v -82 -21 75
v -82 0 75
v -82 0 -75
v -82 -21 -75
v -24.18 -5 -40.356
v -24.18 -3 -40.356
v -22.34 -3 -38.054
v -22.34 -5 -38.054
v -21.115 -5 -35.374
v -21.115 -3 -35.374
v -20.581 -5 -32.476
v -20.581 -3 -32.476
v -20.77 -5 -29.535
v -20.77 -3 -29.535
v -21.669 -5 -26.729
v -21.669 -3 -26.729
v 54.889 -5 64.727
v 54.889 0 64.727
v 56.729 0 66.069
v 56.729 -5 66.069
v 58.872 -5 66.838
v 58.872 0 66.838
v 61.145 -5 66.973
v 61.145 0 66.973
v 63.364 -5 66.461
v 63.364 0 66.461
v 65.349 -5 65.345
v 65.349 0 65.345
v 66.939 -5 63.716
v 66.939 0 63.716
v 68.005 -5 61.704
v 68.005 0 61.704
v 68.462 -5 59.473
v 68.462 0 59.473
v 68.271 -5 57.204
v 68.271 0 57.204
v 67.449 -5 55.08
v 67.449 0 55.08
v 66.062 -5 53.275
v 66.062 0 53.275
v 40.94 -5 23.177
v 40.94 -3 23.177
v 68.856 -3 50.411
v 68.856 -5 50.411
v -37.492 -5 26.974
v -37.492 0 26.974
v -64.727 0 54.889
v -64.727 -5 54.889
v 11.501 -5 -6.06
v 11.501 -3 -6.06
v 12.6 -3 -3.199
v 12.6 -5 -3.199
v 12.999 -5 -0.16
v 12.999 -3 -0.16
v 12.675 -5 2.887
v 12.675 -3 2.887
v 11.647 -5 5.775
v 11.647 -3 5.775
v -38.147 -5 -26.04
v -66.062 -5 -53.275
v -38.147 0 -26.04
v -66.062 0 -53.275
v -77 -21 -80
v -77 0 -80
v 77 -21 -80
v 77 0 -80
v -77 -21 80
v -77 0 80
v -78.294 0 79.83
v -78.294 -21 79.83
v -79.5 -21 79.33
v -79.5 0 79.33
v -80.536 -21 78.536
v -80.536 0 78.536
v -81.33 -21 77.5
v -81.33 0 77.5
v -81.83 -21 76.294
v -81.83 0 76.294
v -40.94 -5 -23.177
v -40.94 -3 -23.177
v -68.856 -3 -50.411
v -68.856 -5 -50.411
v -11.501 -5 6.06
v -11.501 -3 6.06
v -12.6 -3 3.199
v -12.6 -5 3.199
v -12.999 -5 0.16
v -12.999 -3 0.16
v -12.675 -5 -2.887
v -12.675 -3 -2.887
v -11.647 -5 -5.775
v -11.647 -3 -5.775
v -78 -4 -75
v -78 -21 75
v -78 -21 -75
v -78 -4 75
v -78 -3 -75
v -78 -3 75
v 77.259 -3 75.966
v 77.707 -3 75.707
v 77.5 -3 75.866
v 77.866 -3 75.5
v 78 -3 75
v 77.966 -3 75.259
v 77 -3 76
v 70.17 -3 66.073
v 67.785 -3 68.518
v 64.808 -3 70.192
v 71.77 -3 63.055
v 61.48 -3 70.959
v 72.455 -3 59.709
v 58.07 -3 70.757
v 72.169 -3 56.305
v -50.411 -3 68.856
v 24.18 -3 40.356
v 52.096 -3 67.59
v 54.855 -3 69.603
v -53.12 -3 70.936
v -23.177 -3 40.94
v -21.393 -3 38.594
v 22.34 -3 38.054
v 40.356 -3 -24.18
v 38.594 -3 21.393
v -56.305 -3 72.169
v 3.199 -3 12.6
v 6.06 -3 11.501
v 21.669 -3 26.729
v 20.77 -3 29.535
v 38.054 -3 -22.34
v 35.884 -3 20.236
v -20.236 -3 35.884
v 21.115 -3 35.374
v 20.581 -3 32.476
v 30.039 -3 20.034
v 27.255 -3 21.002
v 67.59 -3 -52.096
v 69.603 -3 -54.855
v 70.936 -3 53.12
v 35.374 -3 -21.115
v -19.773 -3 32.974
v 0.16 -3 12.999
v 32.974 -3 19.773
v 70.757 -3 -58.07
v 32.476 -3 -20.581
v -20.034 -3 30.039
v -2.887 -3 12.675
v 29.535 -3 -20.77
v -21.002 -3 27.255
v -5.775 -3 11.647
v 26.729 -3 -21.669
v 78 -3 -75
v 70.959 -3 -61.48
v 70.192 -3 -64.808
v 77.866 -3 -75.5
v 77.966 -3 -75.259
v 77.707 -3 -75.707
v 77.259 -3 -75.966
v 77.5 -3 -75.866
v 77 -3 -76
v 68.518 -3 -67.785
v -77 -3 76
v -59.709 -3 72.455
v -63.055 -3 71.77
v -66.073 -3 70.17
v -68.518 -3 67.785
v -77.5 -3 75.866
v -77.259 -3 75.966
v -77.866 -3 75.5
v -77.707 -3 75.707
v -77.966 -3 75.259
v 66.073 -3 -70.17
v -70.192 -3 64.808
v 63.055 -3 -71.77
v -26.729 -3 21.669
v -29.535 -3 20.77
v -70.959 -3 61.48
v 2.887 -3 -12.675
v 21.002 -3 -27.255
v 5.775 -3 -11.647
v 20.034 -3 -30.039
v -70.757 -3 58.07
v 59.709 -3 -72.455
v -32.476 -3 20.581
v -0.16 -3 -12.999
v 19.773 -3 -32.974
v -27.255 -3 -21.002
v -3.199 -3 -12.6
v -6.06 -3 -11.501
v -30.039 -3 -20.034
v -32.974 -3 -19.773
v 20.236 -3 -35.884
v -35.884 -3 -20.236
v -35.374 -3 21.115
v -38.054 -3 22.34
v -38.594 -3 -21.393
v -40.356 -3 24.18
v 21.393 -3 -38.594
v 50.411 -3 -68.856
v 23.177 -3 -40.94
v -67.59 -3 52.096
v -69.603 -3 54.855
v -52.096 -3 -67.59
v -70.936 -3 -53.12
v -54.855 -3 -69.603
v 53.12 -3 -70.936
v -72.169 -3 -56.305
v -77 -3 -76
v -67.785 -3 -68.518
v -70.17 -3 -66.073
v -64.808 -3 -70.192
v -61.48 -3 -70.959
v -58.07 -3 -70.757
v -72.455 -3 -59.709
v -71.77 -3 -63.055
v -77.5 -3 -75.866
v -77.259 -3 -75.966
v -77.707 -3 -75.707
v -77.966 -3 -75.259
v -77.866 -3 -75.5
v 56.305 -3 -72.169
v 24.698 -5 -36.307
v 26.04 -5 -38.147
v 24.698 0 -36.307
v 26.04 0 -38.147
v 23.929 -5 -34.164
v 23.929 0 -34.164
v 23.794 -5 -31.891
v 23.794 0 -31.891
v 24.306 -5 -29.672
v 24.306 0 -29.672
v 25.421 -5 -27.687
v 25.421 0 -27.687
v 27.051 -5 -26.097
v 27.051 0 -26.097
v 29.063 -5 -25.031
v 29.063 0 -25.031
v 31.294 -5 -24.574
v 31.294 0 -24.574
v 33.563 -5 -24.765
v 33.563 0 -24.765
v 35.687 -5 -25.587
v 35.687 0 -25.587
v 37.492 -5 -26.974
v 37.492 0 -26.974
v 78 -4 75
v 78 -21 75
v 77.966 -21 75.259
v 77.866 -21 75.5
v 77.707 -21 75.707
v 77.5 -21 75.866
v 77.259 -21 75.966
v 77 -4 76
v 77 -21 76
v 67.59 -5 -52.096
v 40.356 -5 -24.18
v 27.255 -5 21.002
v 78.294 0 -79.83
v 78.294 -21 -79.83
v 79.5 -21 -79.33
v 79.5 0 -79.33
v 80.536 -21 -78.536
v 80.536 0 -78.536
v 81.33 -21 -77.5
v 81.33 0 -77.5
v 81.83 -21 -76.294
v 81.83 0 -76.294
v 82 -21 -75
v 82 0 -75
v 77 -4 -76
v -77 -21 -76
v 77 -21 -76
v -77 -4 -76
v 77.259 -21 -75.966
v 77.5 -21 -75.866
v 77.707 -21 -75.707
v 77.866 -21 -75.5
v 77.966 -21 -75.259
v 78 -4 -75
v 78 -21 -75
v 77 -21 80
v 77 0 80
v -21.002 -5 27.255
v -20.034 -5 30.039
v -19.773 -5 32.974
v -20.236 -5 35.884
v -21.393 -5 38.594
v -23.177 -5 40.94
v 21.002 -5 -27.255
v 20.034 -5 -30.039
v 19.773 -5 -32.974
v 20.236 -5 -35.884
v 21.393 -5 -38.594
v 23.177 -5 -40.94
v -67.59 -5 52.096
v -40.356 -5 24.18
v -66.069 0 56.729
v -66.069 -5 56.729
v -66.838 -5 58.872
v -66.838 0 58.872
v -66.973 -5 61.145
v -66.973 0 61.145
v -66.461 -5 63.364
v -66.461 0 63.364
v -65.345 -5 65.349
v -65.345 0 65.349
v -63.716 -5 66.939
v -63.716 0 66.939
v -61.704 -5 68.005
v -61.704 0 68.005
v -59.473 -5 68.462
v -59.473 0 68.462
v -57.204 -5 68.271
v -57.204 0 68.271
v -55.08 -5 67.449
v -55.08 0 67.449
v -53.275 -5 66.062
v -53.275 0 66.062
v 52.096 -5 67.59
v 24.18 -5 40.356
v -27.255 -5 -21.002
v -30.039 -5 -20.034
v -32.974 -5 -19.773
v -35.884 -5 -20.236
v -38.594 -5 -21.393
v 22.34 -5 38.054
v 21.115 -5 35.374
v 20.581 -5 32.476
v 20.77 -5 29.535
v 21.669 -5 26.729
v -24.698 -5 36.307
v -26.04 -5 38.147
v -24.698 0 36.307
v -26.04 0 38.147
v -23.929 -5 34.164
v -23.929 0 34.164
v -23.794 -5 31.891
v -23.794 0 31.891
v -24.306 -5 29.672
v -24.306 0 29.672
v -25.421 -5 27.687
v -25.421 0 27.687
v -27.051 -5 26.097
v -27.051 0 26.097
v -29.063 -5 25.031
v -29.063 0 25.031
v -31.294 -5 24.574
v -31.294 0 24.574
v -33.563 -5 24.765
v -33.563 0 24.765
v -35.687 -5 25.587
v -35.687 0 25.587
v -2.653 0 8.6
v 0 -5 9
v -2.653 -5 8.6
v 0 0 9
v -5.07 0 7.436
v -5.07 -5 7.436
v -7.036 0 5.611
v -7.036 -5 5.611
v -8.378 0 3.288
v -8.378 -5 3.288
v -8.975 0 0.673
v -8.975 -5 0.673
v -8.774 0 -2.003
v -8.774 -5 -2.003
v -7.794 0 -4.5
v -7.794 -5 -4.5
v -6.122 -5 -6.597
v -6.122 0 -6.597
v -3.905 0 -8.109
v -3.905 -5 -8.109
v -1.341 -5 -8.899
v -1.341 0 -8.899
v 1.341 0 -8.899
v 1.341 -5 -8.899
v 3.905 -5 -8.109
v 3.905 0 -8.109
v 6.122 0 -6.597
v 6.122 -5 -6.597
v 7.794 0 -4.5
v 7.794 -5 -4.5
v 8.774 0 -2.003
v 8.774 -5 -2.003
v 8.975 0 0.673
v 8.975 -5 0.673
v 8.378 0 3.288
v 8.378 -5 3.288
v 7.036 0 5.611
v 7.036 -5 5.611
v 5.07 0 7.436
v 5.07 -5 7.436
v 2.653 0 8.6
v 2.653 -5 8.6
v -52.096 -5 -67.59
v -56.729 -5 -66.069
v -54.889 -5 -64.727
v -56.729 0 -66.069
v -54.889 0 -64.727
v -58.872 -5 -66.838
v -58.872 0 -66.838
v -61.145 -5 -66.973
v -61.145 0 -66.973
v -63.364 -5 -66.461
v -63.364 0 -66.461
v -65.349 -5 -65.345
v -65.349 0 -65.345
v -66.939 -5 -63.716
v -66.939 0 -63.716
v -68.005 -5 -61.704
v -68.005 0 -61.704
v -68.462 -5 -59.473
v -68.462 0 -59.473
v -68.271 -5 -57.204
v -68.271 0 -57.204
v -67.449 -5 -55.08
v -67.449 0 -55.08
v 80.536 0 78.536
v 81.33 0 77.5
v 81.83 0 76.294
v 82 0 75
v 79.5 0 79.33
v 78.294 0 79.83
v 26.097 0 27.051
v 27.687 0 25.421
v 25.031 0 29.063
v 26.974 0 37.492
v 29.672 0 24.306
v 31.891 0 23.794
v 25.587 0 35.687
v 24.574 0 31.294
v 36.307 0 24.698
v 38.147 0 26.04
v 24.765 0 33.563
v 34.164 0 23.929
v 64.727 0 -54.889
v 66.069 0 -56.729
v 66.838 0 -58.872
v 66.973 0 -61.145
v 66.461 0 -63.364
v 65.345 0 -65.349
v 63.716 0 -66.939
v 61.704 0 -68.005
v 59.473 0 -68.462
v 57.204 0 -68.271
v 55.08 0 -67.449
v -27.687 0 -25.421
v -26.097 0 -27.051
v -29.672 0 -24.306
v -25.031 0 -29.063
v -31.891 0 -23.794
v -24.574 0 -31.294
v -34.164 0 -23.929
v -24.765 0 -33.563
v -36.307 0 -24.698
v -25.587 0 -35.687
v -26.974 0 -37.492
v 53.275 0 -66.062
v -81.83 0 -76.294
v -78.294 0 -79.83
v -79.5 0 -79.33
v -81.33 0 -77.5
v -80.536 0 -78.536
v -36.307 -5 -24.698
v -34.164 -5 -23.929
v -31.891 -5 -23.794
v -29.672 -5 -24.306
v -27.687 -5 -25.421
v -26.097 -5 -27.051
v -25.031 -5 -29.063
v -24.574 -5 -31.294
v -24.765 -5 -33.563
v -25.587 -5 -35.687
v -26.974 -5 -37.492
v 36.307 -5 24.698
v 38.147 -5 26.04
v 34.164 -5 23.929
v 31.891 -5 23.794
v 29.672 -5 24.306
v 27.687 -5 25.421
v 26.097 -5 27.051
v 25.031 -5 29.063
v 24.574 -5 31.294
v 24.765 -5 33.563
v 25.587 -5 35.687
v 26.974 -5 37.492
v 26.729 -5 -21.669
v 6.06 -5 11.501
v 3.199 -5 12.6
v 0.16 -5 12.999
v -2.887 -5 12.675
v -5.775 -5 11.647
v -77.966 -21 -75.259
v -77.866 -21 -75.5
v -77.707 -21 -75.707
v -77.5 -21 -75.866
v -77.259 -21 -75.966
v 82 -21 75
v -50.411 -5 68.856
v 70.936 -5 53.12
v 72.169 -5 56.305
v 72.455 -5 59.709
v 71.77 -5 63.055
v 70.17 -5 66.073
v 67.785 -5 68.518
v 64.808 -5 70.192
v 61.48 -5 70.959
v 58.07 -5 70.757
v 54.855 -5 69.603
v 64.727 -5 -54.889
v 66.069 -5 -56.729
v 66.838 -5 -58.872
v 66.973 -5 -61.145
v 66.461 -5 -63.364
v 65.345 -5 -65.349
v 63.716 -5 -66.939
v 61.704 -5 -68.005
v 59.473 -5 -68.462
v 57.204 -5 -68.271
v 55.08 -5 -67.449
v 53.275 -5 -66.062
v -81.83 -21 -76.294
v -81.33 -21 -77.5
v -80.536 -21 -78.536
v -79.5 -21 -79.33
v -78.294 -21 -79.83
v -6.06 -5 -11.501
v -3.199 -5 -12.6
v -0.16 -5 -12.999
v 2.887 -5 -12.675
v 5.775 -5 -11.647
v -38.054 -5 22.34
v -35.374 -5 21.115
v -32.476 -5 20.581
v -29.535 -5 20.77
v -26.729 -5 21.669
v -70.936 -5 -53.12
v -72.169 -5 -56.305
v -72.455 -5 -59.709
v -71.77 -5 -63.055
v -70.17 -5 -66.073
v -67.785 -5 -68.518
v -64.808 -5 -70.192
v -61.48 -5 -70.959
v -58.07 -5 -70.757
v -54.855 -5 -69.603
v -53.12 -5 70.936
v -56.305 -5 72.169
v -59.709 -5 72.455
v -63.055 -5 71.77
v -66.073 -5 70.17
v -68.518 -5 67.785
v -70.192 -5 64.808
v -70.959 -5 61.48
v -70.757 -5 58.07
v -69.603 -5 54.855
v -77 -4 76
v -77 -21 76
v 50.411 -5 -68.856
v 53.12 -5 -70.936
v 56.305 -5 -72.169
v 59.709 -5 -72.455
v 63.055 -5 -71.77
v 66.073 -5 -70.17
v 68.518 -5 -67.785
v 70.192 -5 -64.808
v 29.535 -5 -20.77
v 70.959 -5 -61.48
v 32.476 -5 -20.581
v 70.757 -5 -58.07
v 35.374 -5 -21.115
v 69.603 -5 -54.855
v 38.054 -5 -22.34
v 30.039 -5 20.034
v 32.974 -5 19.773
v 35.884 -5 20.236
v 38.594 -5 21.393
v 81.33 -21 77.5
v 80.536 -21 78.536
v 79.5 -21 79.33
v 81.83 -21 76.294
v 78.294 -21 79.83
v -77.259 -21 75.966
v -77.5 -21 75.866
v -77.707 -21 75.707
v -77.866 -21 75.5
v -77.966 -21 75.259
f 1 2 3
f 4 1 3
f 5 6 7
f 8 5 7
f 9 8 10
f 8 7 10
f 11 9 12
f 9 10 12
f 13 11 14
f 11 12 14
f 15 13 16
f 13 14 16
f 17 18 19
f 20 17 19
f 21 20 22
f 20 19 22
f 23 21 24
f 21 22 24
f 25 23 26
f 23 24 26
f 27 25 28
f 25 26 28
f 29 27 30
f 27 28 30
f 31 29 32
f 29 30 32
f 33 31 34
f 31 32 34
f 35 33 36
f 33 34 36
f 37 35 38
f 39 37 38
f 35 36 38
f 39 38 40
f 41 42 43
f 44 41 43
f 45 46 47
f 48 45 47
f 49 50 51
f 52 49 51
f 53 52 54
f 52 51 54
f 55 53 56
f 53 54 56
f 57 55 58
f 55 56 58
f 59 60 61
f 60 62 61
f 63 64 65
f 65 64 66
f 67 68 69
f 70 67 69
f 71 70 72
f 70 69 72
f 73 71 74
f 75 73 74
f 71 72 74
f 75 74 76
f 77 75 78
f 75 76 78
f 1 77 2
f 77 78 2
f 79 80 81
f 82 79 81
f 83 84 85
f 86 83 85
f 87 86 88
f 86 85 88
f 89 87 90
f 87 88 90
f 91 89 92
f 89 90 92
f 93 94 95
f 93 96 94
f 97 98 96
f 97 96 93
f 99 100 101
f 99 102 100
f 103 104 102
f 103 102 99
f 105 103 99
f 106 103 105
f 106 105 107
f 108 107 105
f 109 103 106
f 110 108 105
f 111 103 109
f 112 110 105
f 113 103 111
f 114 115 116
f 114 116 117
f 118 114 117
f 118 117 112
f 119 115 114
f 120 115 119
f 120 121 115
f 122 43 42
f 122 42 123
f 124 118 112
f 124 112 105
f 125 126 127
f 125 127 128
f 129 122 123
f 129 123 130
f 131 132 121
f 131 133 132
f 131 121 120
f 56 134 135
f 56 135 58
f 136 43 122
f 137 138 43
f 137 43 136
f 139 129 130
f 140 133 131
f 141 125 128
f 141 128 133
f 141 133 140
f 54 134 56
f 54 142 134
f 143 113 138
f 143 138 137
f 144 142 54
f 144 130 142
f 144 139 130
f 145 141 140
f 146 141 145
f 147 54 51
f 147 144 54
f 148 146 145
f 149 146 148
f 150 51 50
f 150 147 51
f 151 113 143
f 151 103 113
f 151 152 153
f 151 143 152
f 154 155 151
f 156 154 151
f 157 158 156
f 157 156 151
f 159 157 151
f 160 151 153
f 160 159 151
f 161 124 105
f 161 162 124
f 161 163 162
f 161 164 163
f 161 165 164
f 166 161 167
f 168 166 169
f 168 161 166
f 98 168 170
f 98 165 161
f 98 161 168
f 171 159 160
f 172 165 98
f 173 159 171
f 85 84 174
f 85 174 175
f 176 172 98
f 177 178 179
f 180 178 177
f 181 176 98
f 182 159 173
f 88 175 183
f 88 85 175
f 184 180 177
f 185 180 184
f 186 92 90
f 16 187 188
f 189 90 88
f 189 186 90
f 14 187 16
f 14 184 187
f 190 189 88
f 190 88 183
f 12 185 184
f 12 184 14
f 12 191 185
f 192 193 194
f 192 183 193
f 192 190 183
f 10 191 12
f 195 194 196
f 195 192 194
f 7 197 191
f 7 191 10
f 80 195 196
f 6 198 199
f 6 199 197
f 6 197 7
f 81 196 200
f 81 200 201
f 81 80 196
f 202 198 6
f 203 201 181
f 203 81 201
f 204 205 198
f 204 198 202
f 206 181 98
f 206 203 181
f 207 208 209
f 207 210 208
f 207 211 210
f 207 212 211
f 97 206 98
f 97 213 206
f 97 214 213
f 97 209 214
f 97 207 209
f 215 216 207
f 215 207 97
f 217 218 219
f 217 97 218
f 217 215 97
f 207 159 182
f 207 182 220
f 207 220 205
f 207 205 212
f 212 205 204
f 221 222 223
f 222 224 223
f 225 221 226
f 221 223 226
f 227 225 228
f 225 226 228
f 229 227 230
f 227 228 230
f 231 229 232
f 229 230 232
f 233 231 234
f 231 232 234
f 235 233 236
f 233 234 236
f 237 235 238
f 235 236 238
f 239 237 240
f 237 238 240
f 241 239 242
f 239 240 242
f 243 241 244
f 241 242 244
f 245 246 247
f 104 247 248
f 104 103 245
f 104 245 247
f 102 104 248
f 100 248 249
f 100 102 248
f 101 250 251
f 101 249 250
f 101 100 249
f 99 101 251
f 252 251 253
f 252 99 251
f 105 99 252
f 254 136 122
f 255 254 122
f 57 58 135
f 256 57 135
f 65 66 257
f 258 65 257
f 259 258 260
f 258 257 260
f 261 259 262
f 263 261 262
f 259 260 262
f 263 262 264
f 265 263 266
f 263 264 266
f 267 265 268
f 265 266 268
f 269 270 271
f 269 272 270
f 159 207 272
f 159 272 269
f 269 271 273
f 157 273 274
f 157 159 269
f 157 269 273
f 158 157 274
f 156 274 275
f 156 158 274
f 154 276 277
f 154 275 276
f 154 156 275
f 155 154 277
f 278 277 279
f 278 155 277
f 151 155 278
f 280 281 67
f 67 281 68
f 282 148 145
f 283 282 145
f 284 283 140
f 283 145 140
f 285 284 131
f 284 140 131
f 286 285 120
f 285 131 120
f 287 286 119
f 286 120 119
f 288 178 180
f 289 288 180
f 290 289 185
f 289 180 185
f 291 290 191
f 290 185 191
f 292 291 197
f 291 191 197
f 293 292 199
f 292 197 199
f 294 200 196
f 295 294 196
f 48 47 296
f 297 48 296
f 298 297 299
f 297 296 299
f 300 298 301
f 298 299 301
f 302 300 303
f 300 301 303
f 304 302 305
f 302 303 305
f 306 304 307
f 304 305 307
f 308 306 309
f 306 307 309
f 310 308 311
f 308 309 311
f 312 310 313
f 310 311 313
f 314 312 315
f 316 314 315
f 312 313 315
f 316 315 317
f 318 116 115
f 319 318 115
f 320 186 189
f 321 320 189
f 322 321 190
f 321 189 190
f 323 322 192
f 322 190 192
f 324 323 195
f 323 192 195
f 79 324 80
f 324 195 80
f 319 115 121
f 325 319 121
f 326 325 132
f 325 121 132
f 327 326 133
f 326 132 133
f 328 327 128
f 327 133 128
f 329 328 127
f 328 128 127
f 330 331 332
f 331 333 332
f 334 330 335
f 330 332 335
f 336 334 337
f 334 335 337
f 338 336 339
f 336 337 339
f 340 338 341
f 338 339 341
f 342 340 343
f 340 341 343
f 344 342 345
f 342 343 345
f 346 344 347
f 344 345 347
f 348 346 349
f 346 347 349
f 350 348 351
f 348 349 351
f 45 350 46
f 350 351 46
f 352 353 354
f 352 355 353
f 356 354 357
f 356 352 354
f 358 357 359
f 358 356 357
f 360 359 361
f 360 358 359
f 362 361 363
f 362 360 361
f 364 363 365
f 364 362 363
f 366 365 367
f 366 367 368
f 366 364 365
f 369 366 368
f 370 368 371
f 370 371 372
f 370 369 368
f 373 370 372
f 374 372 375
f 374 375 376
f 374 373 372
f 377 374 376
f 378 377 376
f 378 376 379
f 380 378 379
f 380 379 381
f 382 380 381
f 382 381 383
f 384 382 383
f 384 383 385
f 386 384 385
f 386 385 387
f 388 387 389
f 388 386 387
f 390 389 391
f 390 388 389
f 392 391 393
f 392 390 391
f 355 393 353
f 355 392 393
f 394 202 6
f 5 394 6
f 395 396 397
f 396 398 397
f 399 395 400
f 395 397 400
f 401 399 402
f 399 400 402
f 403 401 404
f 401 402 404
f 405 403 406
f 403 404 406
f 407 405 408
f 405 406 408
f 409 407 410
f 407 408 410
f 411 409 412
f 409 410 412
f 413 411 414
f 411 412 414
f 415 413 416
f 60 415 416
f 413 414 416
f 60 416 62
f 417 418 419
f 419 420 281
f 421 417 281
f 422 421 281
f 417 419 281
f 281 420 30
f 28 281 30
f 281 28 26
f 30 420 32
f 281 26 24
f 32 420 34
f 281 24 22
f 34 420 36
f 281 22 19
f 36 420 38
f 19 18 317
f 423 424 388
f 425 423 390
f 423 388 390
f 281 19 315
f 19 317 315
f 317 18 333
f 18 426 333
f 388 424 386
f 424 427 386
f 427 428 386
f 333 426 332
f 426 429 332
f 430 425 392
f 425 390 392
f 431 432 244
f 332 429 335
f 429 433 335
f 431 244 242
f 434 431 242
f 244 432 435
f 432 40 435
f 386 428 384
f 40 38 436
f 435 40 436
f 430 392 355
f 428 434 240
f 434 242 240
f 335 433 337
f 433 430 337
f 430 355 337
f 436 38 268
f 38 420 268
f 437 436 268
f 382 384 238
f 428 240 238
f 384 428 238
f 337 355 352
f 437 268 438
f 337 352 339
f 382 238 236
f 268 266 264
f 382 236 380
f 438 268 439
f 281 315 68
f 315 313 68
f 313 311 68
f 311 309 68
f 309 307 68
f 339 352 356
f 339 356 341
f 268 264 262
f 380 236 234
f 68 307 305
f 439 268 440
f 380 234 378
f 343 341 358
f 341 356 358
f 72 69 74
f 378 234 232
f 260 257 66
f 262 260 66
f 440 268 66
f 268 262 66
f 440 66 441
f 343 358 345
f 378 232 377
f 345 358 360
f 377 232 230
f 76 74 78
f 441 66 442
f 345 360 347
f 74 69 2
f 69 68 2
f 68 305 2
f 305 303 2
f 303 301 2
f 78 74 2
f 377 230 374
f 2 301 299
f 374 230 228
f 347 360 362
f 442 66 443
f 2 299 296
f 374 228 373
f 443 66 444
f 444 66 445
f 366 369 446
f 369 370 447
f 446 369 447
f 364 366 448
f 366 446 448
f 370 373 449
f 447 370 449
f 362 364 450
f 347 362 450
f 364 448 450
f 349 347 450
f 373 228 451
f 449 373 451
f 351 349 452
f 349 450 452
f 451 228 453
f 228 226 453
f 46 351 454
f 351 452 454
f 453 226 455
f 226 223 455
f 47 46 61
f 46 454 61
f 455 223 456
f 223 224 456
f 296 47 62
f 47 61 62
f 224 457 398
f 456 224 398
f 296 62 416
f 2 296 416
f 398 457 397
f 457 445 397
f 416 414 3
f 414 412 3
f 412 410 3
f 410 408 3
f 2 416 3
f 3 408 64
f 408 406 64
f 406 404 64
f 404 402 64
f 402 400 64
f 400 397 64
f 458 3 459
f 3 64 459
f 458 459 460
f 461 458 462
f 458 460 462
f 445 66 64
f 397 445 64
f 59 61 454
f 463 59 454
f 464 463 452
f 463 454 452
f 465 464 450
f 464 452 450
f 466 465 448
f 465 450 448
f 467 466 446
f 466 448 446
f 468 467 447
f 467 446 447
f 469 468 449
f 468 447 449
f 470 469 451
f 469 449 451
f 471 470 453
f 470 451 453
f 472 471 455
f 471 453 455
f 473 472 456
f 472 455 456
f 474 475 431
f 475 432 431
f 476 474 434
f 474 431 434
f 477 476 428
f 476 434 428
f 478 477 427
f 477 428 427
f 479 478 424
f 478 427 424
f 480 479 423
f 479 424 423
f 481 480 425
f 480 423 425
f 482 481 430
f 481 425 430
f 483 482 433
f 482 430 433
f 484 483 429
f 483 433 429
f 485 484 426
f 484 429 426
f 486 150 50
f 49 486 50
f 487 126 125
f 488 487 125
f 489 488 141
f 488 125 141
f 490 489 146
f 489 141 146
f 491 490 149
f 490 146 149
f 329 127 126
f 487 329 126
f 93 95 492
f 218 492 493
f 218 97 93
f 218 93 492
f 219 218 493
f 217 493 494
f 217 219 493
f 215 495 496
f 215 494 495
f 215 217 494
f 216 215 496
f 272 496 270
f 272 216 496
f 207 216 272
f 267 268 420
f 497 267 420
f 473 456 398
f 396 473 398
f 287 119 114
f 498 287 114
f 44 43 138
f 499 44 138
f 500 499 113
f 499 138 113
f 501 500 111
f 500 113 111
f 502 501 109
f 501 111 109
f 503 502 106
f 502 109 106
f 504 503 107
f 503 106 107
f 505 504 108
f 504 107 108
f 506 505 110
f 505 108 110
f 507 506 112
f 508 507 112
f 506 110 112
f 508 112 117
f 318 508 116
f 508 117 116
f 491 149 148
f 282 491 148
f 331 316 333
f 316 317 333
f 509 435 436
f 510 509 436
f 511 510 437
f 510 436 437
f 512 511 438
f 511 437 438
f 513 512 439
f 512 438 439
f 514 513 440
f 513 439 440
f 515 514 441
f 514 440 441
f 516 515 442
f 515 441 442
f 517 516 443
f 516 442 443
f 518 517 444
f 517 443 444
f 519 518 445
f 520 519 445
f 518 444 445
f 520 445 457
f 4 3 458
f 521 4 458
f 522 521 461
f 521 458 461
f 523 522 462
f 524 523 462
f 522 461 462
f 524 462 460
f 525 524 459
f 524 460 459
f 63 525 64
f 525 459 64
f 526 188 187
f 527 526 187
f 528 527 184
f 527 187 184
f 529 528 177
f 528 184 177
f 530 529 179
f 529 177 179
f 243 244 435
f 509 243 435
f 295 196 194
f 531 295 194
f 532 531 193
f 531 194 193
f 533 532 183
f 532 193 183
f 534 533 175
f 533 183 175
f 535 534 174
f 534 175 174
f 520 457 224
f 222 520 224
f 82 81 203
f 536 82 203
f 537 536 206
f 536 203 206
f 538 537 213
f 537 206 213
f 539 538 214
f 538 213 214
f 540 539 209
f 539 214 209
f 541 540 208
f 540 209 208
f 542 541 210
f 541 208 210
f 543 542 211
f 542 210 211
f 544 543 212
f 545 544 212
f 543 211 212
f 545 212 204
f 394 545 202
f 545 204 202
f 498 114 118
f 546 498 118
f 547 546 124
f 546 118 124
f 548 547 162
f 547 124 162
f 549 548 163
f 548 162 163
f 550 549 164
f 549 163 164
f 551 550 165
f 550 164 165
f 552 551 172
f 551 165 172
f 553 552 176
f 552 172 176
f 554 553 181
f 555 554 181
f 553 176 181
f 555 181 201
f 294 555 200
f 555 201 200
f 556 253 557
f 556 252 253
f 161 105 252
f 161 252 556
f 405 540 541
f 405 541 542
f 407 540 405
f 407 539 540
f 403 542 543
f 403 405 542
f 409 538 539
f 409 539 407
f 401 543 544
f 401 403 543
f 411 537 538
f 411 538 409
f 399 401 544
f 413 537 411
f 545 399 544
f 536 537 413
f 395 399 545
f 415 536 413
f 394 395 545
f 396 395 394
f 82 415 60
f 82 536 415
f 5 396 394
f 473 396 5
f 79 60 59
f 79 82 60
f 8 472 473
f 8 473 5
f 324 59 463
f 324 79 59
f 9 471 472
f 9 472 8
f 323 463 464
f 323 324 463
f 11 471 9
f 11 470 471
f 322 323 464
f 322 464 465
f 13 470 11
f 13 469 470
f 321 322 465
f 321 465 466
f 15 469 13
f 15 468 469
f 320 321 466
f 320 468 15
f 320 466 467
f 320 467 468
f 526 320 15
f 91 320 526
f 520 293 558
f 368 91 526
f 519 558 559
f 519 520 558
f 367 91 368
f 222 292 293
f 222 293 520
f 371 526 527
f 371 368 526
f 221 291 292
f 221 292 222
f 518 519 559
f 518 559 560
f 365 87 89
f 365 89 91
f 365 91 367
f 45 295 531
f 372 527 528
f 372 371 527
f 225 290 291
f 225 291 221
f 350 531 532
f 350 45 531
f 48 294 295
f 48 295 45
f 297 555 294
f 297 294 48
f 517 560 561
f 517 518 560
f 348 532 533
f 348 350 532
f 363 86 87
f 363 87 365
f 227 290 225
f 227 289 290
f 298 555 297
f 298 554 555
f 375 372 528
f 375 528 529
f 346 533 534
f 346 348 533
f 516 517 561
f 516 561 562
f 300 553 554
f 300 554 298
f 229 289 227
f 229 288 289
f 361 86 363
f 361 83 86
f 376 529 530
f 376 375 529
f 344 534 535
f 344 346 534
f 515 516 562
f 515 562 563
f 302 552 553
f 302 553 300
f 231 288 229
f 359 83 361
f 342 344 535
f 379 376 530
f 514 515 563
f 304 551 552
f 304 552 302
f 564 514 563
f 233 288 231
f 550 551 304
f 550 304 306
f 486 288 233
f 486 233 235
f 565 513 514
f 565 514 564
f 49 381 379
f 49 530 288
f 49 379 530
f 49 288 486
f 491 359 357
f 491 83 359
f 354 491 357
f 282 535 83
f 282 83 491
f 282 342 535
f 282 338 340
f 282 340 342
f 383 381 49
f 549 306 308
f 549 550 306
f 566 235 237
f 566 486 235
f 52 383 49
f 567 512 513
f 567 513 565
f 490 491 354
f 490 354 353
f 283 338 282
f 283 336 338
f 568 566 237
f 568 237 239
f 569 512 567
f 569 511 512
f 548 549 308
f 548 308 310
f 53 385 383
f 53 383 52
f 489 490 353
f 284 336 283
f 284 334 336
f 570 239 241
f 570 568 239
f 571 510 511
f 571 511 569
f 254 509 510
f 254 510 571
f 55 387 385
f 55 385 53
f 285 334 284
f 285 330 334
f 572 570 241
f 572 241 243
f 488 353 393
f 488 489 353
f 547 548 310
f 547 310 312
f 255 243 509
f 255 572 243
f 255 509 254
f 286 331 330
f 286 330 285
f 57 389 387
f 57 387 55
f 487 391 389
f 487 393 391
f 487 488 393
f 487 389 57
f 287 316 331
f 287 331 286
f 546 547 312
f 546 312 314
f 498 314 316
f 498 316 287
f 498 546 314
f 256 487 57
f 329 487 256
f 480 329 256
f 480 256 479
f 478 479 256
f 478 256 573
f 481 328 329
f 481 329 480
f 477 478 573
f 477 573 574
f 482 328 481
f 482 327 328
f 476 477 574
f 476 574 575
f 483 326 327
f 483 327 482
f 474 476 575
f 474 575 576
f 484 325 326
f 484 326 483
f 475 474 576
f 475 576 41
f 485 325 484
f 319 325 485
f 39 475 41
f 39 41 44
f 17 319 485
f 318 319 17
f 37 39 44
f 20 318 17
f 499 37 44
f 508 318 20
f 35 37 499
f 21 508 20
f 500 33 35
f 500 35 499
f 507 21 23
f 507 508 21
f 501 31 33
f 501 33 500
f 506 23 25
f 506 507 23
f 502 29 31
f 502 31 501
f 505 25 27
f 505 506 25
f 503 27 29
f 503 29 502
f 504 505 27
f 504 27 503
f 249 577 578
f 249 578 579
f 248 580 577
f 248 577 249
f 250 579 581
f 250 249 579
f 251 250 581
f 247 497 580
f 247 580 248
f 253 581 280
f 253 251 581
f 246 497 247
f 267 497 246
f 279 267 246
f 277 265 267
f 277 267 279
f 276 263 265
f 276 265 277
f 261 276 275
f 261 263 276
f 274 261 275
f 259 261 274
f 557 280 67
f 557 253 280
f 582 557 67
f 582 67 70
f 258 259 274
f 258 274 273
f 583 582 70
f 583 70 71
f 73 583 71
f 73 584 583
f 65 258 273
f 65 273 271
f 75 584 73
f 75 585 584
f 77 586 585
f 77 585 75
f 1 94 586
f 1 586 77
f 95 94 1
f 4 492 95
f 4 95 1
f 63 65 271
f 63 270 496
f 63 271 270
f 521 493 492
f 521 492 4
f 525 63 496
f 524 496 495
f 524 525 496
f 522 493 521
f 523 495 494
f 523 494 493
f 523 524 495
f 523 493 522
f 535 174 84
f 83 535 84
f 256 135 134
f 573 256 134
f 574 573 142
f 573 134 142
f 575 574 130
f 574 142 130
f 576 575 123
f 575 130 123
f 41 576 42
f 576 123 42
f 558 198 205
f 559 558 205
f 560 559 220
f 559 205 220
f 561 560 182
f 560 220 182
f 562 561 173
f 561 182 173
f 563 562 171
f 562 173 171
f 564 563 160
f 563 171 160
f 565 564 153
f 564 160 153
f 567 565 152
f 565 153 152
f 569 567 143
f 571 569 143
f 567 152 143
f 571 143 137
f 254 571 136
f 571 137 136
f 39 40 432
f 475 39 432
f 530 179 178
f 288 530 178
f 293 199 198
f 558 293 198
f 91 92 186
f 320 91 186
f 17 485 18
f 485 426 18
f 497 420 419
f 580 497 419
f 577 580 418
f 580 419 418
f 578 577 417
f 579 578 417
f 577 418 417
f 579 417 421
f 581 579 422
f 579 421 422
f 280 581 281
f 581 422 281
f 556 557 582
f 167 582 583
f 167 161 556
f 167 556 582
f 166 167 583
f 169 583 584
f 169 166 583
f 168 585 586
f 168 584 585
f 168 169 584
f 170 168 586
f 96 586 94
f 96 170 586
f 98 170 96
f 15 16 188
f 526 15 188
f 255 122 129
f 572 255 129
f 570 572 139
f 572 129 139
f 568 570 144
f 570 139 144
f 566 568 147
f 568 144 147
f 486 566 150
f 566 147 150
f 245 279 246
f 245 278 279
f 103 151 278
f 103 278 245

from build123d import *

# Parameters (mm, degrees)
SKETCH1_R           = 9
BOSS_EXTRUDE1_DEPTH = 21
SHELL1_T            = -4
MOVE_FACE1_BY       = 1
SKETCH1_4_R         = 9
CUT_EXTRUDE1_DEPTH  = 117.468879964
SKETCH2_R           = 9
BOSS_EXTRUDE2_DEPTH = 2


with BuildPart() as part:
    # Sketch1 → Boss-Extrude1 (new body)
    # profile 1 of 6: a face of its own
    with BuildSketch(Plane(origin=(0, 0, 0), x_dir=(1, 0, 0), z_dir=(0, 1, 0))):
        with BuildLine():
            ThreePointArc((-82, 75), (-80.535533906, 78.535533906), (-77, 80))
            Line((-77, 80), (77, 80))
            ThreePointArc((77, 80), (80.535533906, 78.535533906), (82, 75))
            Line((82, 75), (82, -75))
            ThreePointArc((82, -75), (80.535533906, -78.535533906), (77, -80))
            Line((77, -80), (-77, -80))
            ThreePointArc((-77, -80), (-80.535533906, -78.535533906), (-82, -75))
            Line((-82, -75), (-82, 75))
        make_face()
        Circle(SKETCH1_R, mode=Mode.SUBTRACT)
        with BuildLine():
            Line((-54.889206332, 64.727033293), (-26.973710346, 37.492403062))
            ThreePointArc((-26.973710346, 37.492403062), (-26.834045575, 26.179556659), (-38.146891979, 26.039891888))
            Line((-38.146891979, 26.039891888), (-66.062387966, 53.274522119))
            ThreePointArc((-66.062387966, 53.274522119), (-66.202052736, 64.587368523), (-54.889206332, 64.727033293))
        make_face(mode=Mode.SUBTRACT)
        with BuildLine():
            Line((53.274522119, 66.062387966), (26.039891888, 38.146891979))
            ThreePointArc((26.039891888, 38.146891979), (26.179556659, 26.834045575), (37.492403062, 26.973710346))
            Line((37.492403062, 26.973710346), (64.727033293, 54.889206332))
            ThreePointArc((64.727033293, 54.889206332), (64.587368523, 66.202052736), (53.274522119, 66.062387966))
        make_face(mode=Mode.SUBTRACT)
        with BuildLine():
            Line((66.062387966, -53.274522119), (38.146891979, -26.039891888))
            ThreePointArc((38.146891979, -26.039891888), (26.834045575, -26.179556659), (26.973710346, -37.492403062))
            Line((26.973710346, -37.492403062), (54.889206332, -64.727033293))
            ThreePointArc((54.889206332, -64.727033293), (66.202052736, -64.587368523), (66.062387966, -53.274522119))
        make_face(mode=Mode.SUBTRACT)
        with BuildLine():
            Line((-53.274522119, -66.062387966), (-26.039891888, -38.146891979))
            ThreePointArc((-26.039891888, -38.146891979), (-26.179556659, -26.834045575), (-37.492403062, -26.973710346))
            Line((-37.492403062, -26.973710346), (-64.727033293, -54.889206332))
            ThreePointArc((-64.727033293, -54.889206332), (-64.587368523, -66.202052736), (-53.274522119, -66.062387966))
        make_face(mode=Mode.SUBTRACT)
    # profile 2 of 6: a face of its own
    with BuildSketch(Plane(origin=(0, 0, 0), x_dir=(1, 0, 0), z_dir=(0, 1, 0))):
        with BuildLine():
            ThreePointArc((-26.973710346, 37.492403062), (-26.834045575, 26.179556659), (-38.146891979, 26.039891888))
            Line((-38.146891979, 26.039891888), (-66.062387966, 53.274522119))
            ThreePointArc((-66.062387966, 53.274522119), (-66.202052736, 64.587368523), (-54.889206332, 64.727033293))
            Line((-54.889206332, 64.727033293), (-26.973710346, 37.492403062))
        make_face()
    # profile 3 of 6: a face of its own
    with BuildSketch(Plane(origin=(0, 0, 0), x_dir=(1, 0, 0), z_dir=(0, 1, 0))):
        with BuildLine():
            ThreePointArc((-53.274522119, -66.062387966), (-64.587368523, -66.202052736), (-64.727033293, -54.889206332))
            Line((-64.727033293, -54.889206332), (-37.492403062, -26.973710346))
            ThreePointArc((-37.492403062, -26.973710346), (-26.179556659, -26.834045575), (-26.039891888, -38.146891979))
            Line((-26.039891888, -38.146891979), (-53.274522119, -66.062387966))
        make_face()
    # profile 4 of 6: a face of its own
    with BuildSketch(Plane(origin=(0, 0, 0), x_dir=(1, 0, 0), z_dir=(0, 1, 0))):
        Circle(SKETCH1_R)
    # profile 5 of 6: a face of its own
    with BuildSketch(Plane(origin=(0, 0, 0), x_dir=(1, 0, 0), z_dir=(0, 1, 0))):
        with BuildLine():
            ThreePointArc((66.062387966, -53.274522119), (66.202052736, -64.587368523), (54.889206332, -64.727033293))
            Line((54.889206332, -64.727033293), (26.973710346, -37.492403062))
            ThreePointArc((26.973710346, -37.492403062), (26.834045575, -26.179556659), (38.146891979, -26.039891888))
            Line((38.146891979, -26.039891888), (66.062387966, -53.274522119))
        make_face()
    # profile 6 of 6: a face of its own
    with BuildSketch(Plane(origin=(0, 0, 0), x_dir=(1, 0, 0), z_dir=(0, 1, 0))):
        with BuildLine():
            ThreePointArc((53.274522119, 66.062387966), (64.587368523, 66.202052736), (64.727033293, 54.889206332))
            Line((64.727033293, 54.889206332), (37.492403062, 26.973710346))
            ThreePointArc((37.492403062, 26.973710346), (26.179556659, 26.834045575), (26.039891888, 38.146891979))
            Line((26.039891888, 38.146891979), (53.274522119, 66.062387966))
        make_face()
    extrude(amount=-BOSS_EXTRUDE1_DEPTH)

    # Shell1
    shell1_openings = [part.faces().sort_by_distance(p)[0] for p in [
        (0, -21, 0),
    ]]
    offset(amount=SHELL1_T, openings=shell1_openings, kind=Kind.INTERSECTION)

    # Move Face1: a face moved inward by 1.0
    extrude(part.faces().sort_by_distance((0, -4, 0))[0], amount=MOVE_FACE1_BY, dir=(0, 1, 0), mode=Mode.SUBTRACT)

    # Sketch1<4> → Cut-Extrude1 (cut, through all)
    with BuildSketch(Plane(origin=(0, 0, 0), x_dir=(1, 0, 0), z_dir=(0, 1, 0))):
        with BuildLine():
            ThreePointArc((-26.973710346, 37.492403062), (-26.834045575, 26.179556659), (-38.146891979, 26.039891888))
            Line((-38.146891979, 26.039891888), (-66.062387966, 53.274522119))
            ThreePointArc((-66.062387966, 53.274522119), (-66.202052736, 64.587368523), (-54.889206332, 64.727033293))
            Line((-54.889206332, 64.727033293), (-26.973710346, 37.492403062))
        make_face()
        with BuildLine():
            ThreePointArc((-53.274522119, -66.062387966), (-64.587368523, -66.202052736), (-64.727033293, -54.889206332))
            Line((-64.727033293, -54.889206332), (-37.492403062, -26.973710346))
            ThreePointArc((-37.492403062, -26.973710346), (-26.179556659, -26.834045575), (-26.039891888, -38.146891979))
            Line((-26.039891888, -38.146891979), (-53.274522119, -66.062387966))
        make_face()
        with BuildLine():
            ThreePointArc((66.062387966, -53.274522119), (66.202052736, -64.587368523), (54.889206332, -64.727033293))
            Line((54.889206332, -64.727033293), (26.973710346, -37.492403062))
            ThreePointArc((26.973710346, -37.492403062), (26.834045575, -26.179556659), (38.146891979, -26.039891888))
            Line((38.146891979, -26.039891888), (66.062387966, -53.274522119))
        make_face()
        with BuildLine():
            ThreePointArc((53.274522119, 66.062387966), (64.587368523, 66.202052736), (64.727033293, 54.889206332))
            Line((64.727033293, 54.889206332), (37.492403062, 26.973710346))
            ThreePointArc((37.492403062, 26.973710346), (26.179556659, 26.834045575), (26.039891888, 38.146891979))
            Line((26.039891888, 38.146891979), (53.274522119, 66.062387966))
        make_face()
        with Locations(Location((0, 0, 0), (0, 0, 270))):
            Circle(SKETCH1_4_R)
    extrude(amount=-CUT_EXTRUDE1_DEPTH, mode=Mode.SUBTRACT)

    # Sketch2 → Boss-Extrude2 (add)
    with BuildSketch(Plane.XZ.offset(3)):
        with BuildLine():
            Line((-5.774661215, 11.647029143), (-21.002387182, 27.255448258))
            ThreePointArc((-21.002387182, 27.255448258), (-19.914815745, 34.443366807), (-23.176764095, 40.940187387))
            Line((-23.176764095, 40.940187387), (-50.411394326, 68.855683374))
            ThreePointArc((-50.411394326, 68.855683374), (-67.380663931, 69.06518053), (-67.590161087, 52.095910924))
            Line((-67.590161087, 52.095910924), (-40.355530856, 24.180414937))
            ThreePointArc((-40.355530856, 24.180414937), (-33.94122007, 20.759069904), (-26.728642769, 21.668857441))
            Line((-26.728642769, 21.668857441), (-11.500916802, 6.060438326))
            ThreePointArc((-11.500916802, 6.060438326), (-12.999009411, 0.160481598), (-11.647029143, -5.774661215))
            Line((-11.647029143, -5.774661215), (-27.255448258, -21.002387182))
            ThreePointArc((-27.255448258, -21.002387182), (-34.443366807, -19.914815745), (-40.940187387, -23.176764095))
            Line((-40.940187387, -23.176764095), (-68.855683374, -50.411394326))
            ThreePointArc((-68.855683374, -50.411394326), (-69.06518053, -67.380663931), (-52.095910924, -67.590161087))
            Line((-52.095910924, -67.590161087), (-24.180414937, -40.355530856))
            ThreePointArc((-24.180414937, -40.355530856), (-20.759069904, -33.94122007), (-21.668857441, -26.728642769))
            Line((-21.668857441, -26.728642769), (-6.060438326, -11.500916802))
            ThreePointArc((-6.060438326, -11.500916802), (-0.160481598, -12.999009411), (5.774661215, -11.647029143))
            Line((5.774661215, -11.647029143), (21.002387182, -27.255448258))
            ThreePointArc((21.002387182, -27.255448258), (19.914815745, -34.443366807), (23.176764095, -40.940187387))
            Line((23.176764095, -40.940187387), (50.411394326, -68.855683374))
            ThreePointArc((50.411394326, -68.855683374), (67.380663931, -69.06518053), (67.590161087, -52.095910924))
            Line((67.590161087, -52.095910924), (40.355530856, -24.180414937))
            ThreePointArc((40.355530856, -24.180414937), (33.94122007, -20.759069904), (26.728642769, -21.668857441))
            Line((26.728642769, -21.668857441), (11.500916802, -6.060438326))
            ThreePointArc((11.500916802, -6.060438326), (12.999009411, -0.160481598), (11.647029143, 5.774661215))
            Line((11.647029143, 5.774661215), (27.255448258, 21.002387182))
            ThreePointArc((27.255448258, 21.002387182), (34.443366807, 19.914815745), (40.940187387, 23.176764095))
            Line((40.940187387, 23.176764095), (68.855683374, 50.411394326))
            ThreePointArc((68.855683374, 50.411394326), (69.06518053, 67.380663931), (52.095910924, 67.590161087))
            Line((52.095910924, 67.590161087), (24.180414937, 40.355530856))
            ThreePointArc((24.180414937, 40.355530856), (20.759069904, 33.94122007), (21.668857441, 26.728642769))
            Line((21.668857441, 26.728642769), (6.060438326, 11.500916802))
            ThreePointArc((6.060438326, 11.500916802), (0.160481598, 12.999009411), (-5.774661215, 11.647029143))
        make_face()
        with BuildLine():
            ThreePointArc((-54.889206332, -64.727033293), (-66.202052736, -64.587368523), (-66.062387966, -53.274522119))
            Line((-66.062387966, -53.274522119), (-38.146891979, -26.039891888))
            ThreePointArc((-38.146891979, -26.039891888), (-26.834045575, -26.179556659), (-26.973710346, -37.492403062))
            Line((-26.973710346, -37.492403062), (-54.889206332, -64.727033293))
        make_face(mode=Mode.SUBTRACT)
        with Locations(Location((0, 0, 0), (0, 0, 90))):
            Circle(SKETCH2_R, mode=Mode.SUBTRACT)
        with BuildLine():
            Line((-53.274522119, 66.062387966), (-26.039891888, 38.146891979))
            ThreePointArc((-26.039891888, 38.146891979), (-26.179556659, 26.834045575), (-37.492403062, 26.973710346))
            Line((-37.492403062, 26.973710346), (-64.727033293, 54.889206332))
            ThreePointArc((-64.727033293, 54.889206332), (-64.587368523, 66.202052736), (-53.274522119, 66.062387966))
        make_face(mode=Mode.SUBTRACT)
        with BuildLine():
            ThreePointArc((38.146891979, 26.039891888), (26.834045575, 26.179556659), (26.973710346, 37.492403062))
            Line((26.973710346, 37.492403062), (54.889206332, 64.727033293))
            ThreePointArc((54.889206332, 64.727033293), (66.202052736, 64.587368523), (66.062387966, 53.274522119))
            Line((66.062387966, 53.274522119), (38.146891979, 26.039891888))
        make_face(mode=Mode.SUBTRACT)
        with BuildLine():
            ThreePointArc((26.039891888, -38.146891979), (26.179556659, -26.834045575), (37.492403062, -26.973710346))
            Line((37.492403062, -26.973710346), (64.727033293, -54.889206332))
            ThreePointArc((64.727033293, -54.889206332), (64.587368523, -66.202052736), (53.274522119, -66.062387966))
            Line((53.274522119, -66.062387966), (26.039891888, -38.146891979))
        make_face(mode=Mode.SUBTRACT)
    extrude(amount=BOSS_EXTRUDE2_DEPTH)


solid = part.part
